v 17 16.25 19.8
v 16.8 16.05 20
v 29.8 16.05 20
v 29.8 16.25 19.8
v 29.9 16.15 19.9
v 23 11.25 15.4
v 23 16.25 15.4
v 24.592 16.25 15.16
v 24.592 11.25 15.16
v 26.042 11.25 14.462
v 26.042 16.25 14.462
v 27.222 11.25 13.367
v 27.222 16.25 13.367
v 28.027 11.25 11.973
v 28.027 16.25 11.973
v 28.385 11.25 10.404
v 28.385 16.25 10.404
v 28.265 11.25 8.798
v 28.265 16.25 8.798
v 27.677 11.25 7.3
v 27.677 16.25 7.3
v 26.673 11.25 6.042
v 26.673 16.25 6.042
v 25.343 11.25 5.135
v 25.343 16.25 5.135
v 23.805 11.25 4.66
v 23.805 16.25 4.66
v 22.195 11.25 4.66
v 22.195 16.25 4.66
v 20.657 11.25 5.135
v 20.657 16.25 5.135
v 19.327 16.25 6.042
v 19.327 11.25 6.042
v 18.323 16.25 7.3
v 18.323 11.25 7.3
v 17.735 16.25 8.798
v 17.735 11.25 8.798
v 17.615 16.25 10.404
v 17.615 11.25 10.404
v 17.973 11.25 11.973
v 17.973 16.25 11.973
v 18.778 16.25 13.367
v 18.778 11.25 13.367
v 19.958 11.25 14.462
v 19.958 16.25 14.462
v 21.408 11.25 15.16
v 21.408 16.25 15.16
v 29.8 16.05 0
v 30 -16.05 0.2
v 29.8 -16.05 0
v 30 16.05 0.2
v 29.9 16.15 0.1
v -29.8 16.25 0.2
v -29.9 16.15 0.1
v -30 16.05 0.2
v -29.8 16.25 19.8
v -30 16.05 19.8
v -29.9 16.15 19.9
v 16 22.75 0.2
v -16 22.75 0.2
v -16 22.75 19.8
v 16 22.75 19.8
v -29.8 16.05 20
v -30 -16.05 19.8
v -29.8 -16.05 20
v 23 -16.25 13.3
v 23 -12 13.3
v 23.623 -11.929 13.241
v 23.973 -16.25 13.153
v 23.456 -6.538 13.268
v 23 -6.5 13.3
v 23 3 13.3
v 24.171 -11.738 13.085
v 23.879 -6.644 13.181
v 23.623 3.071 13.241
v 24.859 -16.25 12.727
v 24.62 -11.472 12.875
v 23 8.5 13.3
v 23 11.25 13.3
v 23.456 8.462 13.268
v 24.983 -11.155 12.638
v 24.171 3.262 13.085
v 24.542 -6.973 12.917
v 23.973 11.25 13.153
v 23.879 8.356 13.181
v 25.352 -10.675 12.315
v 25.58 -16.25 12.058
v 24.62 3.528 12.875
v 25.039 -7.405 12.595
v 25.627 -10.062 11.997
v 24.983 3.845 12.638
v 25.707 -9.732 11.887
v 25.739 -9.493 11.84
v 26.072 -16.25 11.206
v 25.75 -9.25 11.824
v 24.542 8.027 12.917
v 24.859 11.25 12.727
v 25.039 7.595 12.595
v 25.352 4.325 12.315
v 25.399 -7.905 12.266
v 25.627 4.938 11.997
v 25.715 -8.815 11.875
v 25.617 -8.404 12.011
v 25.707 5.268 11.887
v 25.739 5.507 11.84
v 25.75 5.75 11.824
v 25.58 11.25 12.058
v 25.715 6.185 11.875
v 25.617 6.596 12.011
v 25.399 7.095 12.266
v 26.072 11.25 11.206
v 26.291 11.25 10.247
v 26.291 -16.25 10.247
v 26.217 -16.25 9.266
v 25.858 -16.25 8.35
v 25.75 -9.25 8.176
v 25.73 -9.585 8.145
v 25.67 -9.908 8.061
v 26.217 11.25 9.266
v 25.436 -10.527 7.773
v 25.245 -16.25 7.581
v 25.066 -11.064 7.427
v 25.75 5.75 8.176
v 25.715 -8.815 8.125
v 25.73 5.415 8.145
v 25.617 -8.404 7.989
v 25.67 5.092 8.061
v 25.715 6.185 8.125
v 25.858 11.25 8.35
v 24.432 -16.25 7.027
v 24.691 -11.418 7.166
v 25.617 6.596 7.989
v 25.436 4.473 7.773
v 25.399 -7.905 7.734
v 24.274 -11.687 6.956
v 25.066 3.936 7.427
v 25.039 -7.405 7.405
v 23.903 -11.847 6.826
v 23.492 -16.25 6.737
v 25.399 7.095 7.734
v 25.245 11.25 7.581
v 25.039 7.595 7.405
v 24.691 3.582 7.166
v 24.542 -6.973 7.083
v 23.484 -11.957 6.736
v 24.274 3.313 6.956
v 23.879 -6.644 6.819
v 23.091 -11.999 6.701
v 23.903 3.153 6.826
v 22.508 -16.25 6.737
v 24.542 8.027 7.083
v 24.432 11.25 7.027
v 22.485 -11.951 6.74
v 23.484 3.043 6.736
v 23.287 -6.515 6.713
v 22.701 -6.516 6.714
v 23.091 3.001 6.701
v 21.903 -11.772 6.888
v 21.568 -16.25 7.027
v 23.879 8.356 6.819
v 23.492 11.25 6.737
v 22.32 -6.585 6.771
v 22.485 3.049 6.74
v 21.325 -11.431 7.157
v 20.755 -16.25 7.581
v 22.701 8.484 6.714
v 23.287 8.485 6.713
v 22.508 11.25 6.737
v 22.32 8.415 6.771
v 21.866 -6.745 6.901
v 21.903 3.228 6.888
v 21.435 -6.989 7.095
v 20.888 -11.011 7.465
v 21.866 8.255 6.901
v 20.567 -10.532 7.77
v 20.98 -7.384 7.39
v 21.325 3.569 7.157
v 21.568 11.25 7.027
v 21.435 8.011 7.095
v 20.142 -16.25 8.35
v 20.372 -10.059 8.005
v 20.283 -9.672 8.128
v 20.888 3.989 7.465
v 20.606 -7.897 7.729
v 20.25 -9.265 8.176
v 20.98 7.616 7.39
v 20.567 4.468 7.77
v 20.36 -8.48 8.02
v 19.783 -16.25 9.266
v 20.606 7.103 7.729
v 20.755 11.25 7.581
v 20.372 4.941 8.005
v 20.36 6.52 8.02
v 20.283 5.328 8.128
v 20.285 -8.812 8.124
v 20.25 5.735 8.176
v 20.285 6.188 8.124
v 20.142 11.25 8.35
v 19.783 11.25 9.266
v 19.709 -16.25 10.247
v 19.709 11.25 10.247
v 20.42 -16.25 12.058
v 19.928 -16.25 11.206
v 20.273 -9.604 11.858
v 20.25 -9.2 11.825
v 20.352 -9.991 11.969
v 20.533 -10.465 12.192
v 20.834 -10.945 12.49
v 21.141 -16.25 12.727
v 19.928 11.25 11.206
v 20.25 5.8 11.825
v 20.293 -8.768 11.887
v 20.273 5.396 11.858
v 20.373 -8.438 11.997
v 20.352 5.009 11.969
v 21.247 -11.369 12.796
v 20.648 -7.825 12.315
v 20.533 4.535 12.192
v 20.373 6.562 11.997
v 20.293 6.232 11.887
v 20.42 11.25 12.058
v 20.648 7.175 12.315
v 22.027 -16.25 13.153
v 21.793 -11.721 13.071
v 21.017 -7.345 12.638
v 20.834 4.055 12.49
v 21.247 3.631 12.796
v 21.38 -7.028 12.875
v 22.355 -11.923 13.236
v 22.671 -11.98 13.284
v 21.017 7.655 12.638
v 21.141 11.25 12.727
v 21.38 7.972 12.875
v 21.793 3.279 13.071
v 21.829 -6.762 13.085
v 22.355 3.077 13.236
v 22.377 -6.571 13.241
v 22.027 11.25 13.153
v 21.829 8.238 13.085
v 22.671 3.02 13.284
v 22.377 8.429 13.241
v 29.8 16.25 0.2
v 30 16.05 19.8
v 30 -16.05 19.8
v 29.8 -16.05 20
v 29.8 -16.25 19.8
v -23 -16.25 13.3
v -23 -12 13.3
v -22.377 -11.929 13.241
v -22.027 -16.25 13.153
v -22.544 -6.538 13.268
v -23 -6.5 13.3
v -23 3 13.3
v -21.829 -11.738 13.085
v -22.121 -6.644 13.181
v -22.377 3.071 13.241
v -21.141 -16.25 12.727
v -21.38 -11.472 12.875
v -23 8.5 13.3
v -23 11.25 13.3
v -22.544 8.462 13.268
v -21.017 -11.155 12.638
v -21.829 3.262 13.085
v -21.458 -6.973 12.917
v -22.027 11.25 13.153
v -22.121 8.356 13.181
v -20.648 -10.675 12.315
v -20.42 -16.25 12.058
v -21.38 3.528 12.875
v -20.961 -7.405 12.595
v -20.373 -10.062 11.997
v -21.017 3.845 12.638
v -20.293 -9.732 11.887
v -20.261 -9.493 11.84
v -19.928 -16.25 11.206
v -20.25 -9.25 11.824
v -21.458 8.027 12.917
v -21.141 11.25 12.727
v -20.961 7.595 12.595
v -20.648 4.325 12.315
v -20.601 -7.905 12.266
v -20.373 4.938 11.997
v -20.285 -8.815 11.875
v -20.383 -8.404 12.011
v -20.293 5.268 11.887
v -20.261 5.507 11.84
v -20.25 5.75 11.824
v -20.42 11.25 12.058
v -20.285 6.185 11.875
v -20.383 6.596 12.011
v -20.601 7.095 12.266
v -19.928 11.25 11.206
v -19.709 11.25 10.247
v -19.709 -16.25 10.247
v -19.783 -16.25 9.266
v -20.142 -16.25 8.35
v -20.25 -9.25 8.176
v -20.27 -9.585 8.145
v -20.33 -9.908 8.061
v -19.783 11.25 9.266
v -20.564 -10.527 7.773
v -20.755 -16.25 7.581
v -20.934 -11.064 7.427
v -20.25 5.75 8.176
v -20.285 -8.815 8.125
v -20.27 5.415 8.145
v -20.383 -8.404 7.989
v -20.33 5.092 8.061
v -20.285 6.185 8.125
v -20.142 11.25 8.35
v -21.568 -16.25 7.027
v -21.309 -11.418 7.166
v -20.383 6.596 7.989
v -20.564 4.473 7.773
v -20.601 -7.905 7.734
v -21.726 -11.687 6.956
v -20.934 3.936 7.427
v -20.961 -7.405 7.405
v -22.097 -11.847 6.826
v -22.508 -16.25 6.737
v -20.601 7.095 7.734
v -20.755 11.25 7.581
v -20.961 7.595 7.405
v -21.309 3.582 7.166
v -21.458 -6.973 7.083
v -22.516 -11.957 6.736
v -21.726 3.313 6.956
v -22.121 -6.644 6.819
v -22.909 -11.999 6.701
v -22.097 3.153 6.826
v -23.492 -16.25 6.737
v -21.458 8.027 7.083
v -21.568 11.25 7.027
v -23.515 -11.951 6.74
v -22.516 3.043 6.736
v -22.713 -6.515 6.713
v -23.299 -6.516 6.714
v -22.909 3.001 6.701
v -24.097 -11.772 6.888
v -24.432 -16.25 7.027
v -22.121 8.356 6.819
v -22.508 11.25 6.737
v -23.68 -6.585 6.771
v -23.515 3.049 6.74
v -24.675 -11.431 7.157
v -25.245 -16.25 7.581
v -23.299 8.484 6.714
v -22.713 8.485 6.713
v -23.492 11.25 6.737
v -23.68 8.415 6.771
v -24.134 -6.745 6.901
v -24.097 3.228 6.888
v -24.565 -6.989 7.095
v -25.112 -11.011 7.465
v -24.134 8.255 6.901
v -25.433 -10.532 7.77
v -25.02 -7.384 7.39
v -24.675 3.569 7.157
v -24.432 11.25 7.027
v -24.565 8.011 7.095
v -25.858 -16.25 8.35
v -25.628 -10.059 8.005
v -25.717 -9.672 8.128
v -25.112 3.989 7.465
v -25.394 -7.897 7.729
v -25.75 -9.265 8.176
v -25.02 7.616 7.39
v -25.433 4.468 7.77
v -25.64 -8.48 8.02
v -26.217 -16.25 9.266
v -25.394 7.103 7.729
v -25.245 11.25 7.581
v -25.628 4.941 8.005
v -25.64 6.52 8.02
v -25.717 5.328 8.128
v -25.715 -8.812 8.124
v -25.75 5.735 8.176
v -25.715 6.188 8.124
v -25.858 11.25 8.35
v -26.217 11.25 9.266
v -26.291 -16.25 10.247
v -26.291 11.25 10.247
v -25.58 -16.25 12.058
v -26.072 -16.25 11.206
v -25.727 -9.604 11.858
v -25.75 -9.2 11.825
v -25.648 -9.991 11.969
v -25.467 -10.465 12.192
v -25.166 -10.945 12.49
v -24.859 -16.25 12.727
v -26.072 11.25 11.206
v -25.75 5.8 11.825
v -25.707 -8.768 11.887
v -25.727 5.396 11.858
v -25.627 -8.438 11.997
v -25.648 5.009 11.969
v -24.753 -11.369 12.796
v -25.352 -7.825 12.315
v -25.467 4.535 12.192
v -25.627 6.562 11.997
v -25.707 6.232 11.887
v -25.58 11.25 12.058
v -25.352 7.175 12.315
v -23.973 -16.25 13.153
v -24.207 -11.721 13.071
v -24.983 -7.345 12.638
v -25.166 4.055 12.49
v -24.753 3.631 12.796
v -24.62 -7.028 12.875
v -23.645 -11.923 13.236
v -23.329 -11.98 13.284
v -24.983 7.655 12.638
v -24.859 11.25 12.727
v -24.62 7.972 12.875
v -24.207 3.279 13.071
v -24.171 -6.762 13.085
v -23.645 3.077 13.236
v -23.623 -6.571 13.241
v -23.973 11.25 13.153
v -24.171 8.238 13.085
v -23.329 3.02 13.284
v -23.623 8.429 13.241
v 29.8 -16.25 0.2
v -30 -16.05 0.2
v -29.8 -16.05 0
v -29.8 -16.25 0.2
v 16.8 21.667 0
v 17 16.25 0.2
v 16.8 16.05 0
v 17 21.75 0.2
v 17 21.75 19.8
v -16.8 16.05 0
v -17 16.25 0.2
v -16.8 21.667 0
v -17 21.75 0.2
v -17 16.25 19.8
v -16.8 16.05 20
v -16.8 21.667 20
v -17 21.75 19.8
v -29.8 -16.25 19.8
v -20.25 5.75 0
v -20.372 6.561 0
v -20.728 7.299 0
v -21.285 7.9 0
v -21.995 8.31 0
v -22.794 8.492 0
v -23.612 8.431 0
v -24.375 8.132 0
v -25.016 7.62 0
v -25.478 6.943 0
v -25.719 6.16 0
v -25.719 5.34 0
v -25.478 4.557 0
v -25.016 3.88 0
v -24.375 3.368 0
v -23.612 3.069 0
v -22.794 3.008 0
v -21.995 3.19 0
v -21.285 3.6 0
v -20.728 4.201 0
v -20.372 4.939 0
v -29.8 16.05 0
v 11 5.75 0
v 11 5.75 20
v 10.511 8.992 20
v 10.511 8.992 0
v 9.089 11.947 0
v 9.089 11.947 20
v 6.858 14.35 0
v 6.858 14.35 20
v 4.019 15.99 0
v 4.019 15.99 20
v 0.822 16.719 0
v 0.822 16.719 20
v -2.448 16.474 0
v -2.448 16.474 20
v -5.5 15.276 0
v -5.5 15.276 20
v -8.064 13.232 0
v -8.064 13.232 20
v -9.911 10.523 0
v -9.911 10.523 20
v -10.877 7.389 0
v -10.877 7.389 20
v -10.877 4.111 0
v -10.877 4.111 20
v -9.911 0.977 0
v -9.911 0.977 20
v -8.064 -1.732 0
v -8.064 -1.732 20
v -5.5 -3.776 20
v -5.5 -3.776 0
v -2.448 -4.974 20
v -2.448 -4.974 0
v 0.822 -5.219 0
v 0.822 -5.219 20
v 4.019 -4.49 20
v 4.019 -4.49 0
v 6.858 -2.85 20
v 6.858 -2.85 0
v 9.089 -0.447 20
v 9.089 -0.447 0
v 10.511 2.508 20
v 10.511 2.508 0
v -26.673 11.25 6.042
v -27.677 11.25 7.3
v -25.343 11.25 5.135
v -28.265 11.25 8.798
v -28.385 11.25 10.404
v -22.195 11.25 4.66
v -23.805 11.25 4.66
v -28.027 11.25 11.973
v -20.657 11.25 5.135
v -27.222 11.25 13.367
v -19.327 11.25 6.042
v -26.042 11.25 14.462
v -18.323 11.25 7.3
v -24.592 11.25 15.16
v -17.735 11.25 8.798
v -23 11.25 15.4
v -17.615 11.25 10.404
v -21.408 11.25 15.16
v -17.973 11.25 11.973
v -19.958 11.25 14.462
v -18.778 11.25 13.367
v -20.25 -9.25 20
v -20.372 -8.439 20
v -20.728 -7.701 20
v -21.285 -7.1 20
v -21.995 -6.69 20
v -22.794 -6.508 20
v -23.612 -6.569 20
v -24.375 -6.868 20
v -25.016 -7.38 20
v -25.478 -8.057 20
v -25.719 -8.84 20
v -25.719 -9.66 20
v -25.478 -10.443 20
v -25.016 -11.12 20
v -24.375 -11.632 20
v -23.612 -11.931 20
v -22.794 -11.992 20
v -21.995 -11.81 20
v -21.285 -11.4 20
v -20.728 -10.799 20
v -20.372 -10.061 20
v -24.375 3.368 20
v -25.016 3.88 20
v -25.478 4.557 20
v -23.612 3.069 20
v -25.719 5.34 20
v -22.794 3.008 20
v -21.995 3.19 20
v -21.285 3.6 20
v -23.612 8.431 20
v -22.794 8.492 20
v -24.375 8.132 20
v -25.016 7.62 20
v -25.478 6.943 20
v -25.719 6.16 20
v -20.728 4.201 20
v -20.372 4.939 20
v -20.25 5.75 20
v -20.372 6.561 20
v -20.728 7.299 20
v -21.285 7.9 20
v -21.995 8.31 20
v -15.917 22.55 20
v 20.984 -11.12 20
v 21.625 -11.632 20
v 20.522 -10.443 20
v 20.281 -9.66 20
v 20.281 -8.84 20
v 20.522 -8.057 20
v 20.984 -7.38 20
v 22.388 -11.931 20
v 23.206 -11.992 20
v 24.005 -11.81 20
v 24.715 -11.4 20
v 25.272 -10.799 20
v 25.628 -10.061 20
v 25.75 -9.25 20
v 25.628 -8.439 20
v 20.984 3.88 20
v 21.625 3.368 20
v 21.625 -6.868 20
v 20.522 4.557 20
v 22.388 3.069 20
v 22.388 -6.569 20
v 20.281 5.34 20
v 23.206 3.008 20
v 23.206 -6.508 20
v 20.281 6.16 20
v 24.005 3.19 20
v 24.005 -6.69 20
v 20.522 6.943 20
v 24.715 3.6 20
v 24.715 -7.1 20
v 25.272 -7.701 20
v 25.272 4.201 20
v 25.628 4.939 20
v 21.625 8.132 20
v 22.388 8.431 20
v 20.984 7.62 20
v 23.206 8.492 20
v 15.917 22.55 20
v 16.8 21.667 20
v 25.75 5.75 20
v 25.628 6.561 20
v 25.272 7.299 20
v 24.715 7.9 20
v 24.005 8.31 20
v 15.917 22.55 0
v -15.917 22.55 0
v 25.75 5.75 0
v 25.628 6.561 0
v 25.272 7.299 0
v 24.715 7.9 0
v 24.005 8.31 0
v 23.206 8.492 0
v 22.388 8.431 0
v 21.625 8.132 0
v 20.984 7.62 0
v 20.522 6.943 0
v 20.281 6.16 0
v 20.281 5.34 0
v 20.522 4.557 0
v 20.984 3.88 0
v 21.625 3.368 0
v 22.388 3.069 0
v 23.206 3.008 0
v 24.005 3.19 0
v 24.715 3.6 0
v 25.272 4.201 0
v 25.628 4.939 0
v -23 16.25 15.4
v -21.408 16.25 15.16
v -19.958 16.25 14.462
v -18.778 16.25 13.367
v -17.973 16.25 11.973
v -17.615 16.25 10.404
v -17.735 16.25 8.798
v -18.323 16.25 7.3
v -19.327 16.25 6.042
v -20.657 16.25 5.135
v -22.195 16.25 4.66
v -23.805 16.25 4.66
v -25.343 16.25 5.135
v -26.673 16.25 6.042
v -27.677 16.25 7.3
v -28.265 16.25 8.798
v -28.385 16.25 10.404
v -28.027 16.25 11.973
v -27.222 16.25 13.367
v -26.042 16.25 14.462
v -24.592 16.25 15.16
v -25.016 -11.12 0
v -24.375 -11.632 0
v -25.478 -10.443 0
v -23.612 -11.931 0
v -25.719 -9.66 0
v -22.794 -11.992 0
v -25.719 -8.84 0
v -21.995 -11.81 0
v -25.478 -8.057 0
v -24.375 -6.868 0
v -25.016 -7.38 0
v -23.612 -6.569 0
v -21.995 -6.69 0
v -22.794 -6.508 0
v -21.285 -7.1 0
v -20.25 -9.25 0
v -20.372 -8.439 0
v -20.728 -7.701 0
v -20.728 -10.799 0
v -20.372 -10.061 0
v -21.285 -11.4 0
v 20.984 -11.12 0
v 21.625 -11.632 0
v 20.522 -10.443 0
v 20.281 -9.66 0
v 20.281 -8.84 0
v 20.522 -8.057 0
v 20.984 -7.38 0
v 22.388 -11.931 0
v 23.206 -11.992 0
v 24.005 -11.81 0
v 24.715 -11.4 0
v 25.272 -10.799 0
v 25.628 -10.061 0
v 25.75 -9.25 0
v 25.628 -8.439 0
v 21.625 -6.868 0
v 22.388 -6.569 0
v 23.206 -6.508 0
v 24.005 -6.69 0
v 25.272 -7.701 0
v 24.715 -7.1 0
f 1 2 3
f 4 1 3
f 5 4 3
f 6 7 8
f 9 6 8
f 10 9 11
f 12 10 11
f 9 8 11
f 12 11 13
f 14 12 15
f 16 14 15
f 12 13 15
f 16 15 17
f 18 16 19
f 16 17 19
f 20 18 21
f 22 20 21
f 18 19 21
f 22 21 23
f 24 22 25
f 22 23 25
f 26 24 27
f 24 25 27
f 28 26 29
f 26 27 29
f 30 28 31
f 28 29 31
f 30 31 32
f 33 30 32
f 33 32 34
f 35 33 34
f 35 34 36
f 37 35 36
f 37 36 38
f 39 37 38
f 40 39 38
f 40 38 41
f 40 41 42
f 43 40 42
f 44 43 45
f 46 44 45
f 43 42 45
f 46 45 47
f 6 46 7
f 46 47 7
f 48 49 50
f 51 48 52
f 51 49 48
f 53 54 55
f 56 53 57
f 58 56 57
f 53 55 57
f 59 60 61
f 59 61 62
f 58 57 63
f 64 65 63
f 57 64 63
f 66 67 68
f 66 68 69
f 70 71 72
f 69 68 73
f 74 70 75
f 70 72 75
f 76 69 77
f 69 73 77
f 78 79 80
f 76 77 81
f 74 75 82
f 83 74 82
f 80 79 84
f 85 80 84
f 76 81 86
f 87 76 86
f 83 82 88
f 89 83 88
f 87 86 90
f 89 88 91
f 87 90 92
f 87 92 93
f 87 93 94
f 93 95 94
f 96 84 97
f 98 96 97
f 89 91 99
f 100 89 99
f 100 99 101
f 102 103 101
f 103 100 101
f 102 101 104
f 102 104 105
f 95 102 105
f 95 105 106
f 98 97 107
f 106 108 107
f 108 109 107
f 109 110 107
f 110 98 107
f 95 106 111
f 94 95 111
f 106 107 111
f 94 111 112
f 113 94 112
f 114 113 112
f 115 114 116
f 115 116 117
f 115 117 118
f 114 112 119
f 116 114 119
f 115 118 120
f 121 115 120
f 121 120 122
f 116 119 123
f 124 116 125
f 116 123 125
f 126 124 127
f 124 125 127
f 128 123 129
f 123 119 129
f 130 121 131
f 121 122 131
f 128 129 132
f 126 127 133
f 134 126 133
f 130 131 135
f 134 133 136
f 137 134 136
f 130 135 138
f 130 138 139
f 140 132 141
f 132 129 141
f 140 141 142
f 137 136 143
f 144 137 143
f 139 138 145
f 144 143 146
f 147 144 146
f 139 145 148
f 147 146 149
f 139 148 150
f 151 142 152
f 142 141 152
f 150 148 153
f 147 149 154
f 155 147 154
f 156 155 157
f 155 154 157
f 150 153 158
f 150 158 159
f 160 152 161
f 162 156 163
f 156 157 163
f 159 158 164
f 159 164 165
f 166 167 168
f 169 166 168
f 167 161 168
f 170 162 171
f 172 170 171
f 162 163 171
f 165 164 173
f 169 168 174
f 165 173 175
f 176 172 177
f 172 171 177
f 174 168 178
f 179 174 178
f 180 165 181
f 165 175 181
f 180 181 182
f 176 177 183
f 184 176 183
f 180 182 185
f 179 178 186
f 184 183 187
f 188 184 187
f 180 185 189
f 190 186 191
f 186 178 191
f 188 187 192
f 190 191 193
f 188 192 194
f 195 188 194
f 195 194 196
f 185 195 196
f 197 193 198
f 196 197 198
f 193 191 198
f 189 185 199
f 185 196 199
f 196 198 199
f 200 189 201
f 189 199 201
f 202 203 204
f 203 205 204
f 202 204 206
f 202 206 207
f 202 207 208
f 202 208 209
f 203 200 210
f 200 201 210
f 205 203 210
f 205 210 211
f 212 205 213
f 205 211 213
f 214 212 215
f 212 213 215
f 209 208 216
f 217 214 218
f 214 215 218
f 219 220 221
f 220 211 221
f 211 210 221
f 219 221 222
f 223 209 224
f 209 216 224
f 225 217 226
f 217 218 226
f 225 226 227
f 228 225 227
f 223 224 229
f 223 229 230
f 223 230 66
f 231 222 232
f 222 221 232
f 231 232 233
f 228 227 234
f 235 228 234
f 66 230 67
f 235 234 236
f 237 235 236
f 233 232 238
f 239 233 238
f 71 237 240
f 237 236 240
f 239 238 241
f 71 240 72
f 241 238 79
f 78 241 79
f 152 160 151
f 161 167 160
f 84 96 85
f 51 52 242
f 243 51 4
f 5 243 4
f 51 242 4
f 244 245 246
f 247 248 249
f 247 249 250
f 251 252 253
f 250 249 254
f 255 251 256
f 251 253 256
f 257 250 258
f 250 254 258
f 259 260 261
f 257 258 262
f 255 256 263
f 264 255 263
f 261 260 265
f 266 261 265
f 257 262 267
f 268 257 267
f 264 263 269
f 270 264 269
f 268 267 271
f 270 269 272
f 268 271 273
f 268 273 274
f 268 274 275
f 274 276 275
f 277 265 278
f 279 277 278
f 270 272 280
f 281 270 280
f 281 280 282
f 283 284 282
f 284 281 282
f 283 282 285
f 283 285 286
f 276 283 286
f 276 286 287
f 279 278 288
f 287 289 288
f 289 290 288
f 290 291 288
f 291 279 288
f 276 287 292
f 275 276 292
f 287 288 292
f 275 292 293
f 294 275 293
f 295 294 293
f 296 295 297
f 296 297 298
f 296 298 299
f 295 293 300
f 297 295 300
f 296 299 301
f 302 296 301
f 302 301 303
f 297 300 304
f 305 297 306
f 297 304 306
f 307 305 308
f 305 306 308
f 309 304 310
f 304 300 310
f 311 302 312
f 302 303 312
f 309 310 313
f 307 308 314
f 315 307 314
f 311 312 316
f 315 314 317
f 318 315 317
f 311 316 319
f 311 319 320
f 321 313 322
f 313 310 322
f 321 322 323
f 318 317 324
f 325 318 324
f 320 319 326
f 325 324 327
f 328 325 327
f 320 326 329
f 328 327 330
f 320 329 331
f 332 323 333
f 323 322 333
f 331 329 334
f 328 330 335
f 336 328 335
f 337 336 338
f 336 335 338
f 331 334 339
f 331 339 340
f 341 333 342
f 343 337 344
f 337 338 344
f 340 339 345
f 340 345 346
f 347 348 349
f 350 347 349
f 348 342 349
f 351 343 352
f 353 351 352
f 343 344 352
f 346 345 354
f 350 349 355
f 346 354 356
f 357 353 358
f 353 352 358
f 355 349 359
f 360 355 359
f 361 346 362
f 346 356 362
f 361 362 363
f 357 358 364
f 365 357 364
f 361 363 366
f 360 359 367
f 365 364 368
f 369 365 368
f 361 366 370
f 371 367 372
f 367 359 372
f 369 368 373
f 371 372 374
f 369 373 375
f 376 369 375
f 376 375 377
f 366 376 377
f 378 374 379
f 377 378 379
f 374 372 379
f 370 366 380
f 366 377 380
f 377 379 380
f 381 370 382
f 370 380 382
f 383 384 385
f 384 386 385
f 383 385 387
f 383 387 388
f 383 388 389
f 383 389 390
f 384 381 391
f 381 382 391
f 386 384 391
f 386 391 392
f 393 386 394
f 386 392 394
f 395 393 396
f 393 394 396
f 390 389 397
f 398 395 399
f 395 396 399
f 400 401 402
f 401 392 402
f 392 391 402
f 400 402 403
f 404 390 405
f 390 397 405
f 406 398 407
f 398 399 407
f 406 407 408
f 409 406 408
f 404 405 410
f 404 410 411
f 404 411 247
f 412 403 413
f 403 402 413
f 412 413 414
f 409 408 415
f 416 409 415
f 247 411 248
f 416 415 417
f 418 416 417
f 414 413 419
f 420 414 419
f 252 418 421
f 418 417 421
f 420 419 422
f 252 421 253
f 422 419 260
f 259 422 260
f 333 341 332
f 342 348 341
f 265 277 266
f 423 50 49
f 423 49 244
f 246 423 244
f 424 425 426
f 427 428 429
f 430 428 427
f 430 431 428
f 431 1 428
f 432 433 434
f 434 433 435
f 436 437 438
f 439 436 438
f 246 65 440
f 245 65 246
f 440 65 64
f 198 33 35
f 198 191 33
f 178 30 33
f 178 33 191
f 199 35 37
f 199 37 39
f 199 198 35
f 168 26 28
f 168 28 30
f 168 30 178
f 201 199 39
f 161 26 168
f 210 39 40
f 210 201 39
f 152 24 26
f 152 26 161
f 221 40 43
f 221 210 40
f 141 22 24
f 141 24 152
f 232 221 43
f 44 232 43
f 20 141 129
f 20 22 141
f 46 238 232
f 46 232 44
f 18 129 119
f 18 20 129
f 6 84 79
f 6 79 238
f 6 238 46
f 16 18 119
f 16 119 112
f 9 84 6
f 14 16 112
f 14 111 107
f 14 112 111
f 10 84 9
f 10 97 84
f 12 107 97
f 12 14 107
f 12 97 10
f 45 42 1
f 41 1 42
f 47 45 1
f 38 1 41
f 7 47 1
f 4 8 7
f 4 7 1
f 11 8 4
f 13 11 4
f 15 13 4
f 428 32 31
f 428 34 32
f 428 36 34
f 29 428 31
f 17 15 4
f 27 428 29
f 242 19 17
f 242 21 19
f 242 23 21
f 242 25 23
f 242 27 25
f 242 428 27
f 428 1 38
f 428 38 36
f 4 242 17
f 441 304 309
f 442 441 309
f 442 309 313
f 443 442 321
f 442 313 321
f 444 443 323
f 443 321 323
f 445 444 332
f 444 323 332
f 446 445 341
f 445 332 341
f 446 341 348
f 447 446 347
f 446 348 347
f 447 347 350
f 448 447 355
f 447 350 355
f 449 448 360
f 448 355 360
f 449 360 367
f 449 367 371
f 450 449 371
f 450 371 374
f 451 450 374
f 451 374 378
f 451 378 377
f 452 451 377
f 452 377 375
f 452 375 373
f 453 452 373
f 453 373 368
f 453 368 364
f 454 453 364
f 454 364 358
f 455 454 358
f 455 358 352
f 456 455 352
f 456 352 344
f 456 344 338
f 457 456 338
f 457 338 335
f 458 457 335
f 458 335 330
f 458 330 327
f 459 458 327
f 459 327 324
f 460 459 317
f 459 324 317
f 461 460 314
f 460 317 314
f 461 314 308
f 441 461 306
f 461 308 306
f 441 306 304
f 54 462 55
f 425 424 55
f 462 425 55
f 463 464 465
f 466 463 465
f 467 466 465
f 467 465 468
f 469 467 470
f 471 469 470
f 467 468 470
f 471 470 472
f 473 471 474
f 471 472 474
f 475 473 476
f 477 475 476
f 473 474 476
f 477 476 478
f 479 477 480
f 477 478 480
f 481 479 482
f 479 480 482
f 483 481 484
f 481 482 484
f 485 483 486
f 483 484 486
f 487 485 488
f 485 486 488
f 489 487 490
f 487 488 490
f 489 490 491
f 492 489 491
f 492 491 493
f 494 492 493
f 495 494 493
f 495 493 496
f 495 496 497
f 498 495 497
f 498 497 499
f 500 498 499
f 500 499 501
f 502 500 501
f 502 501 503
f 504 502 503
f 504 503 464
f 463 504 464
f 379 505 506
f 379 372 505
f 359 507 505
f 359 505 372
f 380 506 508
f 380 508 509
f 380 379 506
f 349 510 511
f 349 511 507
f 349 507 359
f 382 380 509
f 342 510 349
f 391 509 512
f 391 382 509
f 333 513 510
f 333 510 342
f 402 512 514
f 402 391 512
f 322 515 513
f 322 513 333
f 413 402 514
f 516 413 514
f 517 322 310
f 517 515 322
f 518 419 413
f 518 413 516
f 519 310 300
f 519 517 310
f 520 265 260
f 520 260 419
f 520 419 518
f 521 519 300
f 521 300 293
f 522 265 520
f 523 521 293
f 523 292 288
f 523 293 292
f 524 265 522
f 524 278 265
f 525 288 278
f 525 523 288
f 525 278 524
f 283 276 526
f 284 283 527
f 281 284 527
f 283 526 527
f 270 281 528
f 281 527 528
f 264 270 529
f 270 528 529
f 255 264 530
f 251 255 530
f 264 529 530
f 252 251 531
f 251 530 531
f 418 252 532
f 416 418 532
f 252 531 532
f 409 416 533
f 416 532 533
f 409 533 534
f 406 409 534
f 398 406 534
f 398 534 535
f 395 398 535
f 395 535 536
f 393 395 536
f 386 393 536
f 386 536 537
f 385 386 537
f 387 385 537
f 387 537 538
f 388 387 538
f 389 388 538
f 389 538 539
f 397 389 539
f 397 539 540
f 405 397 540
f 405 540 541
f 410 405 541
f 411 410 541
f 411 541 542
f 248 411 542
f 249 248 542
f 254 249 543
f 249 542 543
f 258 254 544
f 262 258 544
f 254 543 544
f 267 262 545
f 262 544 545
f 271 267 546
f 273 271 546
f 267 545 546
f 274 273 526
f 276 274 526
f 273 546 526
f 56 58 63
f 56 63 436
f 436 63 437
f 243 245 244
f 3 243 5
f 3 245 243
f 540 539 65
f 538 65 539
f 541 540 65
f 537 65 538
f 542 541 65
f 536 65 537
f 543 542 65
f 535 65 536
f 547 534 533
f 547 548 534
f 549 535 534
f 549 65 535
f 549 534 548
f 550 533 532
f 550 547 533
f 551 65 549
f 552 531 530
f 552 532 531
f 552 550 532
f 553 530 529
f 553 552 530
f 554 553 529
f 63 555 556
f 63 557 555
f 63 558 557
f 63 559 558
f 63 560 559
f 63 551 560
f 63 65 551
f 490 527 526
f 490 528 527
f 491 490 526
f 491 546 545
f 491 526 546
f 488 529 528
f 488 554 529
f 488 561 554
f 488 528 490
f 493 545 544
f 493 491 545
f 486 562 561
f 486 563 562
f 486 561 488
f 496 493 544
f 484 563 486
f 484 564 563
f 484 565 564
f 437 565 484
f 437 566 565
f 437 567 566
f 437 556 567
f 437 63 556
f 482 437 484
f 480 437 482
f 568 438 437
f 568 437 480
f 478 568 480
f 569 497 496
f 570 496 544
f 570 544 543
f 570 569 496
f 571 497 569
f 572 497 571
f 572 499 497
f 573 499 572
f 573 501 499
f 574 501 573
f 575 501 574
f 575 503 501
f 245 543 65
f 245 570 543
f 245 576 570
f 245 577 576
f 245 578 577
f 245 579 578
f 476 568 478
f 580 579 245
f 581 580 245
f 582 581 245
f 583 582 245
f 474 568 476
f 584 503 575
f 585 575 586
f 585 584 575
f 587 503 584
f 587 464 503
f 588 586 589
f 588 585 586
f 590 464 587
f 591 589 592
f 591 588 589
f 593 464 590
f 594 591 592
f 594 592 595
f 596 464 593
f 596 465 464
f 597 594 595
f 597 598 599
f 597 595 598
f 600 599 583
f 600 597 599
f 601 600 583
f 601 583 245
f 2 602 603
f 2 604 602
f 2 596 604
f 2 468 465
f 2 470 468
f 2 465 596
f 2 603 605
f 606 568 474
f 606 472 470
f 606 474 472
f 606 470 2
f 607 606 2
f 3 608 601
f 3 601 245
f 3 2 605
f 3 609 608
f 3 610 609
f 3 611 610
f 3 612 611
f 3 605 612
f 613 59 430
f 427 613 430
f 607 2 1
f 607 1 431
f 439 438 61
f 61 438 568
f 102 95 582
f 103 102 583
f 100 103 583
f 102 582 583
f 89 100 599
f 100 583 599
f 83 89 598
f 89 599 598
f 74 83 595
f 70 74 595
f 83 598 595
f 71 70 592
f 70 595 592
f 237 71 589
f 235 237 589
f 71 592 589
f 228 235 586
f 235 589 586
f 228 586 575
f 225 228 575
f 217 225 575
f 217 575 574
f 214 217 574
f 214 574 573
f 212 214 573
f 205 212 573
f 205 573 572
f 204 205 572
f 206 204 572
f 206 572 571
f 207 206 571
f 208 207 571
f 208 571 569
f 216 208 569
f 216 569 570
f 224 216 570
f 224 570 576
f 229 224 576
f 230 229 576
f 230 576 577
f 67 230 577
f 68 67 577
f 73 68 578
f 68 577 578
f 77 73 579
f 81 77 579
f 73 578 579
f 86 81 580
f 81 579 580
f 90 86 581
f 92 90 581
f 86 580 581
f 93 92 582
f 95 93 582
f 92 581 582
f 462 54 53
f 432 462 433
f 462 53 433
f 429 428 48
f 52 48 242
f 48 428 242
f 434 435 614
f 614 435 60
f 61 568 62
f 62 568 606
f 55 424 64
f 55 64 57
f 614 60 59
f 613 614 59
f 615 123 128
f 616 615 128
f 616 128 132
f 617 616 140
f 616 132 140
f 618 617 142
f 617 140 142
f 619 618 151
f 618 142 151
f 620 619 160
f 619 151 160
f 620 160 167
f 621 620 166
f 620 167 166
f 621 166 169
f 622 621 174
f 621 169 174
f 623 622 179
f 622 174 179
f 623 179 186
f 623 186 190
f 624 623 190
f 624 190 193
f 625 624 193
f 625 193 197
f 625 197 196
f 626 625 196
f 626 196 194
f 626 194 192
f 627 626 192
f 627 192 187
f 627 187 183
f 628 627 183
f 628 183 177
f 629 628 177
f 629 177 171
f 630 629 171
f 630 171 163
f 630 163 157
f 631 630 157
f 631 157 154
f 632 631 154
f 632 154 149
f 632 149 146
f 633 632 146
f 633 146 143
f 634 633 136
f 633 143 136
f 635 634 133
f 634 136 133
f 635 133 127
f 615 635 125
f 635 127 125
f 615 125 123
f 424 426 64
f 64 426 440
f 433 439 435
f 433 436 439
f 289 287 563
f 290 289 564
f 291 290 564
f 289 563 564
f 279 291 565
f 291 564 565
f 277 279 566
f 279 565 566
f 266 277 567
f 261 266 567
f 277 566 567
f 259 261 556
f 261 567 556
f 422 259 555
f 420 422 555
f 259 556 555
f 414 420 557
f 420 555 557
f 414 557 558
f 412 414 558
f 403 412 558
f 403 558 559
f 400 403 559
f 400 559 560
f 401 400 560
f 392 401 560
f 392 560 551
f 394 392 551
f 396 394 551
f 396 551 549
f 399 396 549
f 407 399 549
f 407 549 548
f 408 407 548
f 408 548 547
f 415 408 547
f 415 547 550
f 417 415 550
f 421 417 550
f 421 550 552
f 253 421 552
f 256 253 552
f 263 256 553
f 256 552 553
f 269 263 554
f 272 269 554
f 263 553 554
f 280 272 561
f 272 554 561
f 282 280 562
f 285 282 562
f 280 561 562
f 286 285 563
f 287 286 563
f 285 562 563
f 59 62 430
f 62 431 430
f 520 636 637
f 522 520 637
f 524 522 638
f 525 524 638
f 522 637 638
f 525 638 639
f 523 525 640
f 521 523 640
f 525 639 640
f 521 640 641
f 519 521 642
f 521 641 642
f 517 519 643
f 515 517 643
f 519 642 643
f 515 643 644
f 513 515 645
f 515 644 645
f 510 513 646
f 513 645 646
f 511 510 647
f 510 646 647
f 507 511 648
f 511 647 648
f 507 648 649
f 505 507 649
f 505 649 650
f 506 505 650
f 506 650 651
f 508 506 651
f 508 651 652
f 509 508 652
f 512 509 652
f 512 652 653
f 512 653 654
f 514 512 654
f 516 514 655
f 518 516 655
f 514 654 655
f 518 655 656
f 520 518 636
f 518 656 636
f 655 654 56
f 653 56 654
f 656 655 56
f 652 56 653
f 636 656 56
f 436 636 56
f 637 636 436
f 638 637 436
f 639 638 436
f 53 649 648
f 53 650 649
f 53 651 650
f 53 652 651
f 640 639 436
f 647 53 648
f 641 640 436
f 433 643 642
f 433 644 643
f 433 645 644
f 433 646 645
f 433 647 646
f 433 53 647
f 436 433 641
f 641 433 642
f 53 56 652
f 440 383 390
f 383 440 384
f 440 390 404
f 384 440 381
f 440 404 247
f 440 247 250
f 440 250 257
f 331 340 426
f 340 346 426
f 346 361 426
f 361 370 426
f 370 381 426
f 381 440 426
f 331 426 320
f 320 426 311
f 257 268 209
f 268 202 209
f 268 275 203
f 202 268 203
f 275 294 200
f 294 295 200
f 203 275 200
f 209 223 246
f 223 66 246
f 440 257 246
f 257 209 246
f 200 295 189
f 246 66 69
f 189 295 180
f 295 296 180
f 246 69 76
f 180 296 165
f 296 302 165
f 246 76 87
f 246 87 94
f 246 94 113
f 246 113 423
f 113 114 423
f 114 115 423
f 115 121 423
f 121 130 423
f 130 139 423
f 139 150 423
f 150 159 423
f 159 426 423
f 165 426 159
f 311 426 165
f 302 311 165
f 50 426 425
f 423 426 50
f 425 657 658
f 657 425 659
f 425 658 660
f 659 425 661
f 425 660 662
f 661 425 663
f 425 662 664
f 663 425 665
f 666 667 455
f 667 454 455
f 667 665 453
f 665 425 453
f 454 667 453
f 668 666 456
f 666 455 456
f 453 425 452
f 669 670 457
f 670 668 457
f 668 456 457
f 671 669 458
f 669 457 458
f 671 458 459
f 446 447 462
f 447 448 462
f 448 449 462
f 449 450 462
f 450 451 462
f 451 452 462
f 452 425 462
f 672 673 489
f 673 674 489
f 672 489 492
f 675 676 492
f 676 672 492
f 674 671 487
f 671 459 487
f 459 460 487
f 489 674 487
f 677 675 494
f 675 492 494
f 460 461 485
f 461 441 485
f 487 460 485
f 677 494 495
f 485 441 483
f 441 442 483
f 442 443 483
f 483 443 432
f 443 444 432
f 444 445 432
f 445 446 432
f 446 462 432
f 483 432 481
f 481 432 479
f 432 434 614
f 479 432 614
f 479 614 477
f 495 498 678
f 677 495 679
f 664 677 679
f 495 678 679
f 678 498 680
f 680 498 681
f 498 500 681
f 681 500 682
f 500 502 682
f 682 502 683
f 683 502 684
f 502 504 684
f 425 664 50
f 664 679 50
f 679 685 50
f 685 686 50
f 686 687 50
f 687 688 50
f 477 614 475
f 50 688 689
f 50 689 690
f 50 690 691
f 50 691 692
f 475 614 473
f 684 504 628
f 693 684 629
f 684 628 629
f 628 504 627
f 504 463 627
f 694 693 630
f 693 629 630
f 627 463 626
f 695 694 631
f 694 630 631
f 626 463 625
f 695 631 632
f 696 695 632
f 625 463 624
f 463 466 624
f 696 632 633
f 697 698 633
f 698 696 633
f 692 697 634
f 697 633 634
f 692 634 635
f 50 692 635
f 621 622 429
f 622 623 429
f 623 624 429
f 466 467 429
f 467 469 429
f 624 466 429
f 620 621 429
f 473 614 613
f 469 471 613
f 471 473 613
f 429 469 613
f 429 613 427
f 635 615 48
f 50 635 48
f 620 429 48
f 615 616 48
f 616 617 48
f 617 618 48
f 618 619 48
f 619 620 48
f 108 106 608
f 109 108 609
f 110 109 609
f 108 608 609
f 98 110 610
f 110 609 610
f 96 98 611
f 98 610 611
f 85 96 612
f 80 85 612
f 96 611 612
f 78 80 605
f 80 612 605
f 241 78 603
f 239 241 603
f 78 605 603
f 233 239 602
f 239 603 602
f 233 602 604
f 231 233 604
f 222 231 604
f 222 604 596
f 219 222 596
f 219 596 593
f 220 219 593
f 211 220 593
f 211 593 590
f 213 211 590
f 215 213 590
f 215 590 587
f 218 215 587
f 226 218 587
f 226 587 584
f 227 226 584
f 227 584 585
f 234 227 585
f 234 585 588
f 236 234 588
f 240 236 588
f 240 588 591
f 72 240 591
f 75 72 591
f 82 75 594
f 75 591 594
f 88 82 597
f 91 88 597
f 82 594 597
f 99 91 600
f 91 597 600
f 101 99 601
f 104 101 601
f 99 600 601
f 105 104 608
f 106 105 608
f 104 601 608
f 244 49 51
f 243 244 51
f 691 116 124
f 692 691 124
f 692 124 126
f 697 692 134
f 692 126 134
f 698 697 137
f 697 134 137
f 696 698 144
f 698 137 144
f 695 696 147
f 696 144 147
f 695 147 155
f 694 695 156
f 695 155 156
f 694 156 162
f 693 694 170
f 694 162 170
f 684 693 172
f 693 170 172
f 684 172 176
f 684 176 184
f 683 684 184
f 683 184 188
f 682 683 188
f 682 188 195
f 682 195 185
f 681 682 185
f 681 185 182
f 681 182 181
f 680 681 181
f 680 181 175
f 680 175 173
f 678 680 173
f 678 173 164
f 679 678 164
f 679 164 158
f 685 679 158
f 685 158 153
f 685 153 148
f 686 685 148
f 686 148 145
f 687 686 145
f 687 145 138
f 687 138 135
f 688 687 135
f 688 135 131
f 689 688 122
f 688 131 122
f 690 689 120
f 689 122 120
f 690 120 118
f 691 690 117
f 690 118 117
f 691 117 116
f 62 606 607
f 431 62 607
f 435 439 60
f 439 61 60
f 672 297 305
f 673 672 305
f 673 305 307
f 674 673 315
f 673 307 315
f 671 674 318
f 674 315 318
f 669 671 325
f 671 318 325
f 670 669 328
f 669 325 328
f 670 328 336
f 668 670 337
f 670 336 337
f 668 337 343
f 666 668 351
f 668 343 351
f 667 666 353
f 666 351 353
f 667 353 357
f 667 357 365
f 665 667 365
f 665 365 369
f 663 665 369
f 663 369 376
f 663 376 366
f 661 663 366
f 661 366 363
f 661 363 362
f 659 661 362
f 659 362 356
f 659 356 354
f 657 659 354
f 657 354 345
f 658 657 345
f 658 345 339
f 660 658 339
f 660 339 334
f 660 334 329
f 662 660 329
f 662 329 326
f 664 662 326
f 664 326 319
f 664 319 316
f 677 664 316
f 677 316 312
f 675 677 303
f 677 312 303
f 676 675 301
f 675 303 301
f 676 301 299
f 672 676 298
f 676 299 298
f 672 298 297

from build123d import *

# Parameters (mm, degrees)
SKETCH_1_W          = 60
SKETCH_1_H          = 32.5
EXTRUDE_1_DEPTH     = 20
SKETCH_2_W          = 34
SKETCH_2_H          = 20
EXTRUDE_2_DEPTH     = 6.5
SKETCH_3_R          = 5.4
CUT_EXTRUDE_1_DEPTH = 5
SKETCH_4_R          = 3.3
CUT_EXTRUDE_2_DEPTH = 46.345892868
SKETCH_7_R          = 2.75
CUT_EXTRUDE_3_DEPTH = 43.632880503
SKETCH_8_R          = 11
CUT_EXTRUDE_4_DEPTH = 35
CHAMFER_1_SIZE      = 1
CHAMFER_2_SIZE      = 0.2
CHAMFER_3_SIZE      = 0.2


with BuildPart() as part:
    # 草图1 → 凸台-拉伸1 (new body)
    with BuildSketch(Plane.XY):
        Rectangle(SKETCH_1_W, SKETCH_1_H)
    extrude(amount=EXTRUDE_1_DEPTH)

    # 草图2 → 凸台-拉伸2 (add)
    with BuildSketch(Plane(origin=(0, 16.25, 0), x_dir=(1, 0, 0), z_dir=(0, 1, 0))):
        with Locations((0, -10)):
            Rectangle(SKETCH_2_W, SKETCH_2_H)
    extrude(amount=EXTRUDE_2_DEPTH)

    # 草图3 → 切除-拉伸1 (cut)
    with BuildSketch(Plane(origin=(0, 16.25, 0), x_dir=(1, 0, 0), z_dir=(0, 1, 0))):
        with Locations(Location((-23, -10, 0), (0, 0, 270))):
            Circle(SKETCH_3_R)
        with Locations(Location((23, -10, 0), (0, 0, 270))):
            Circle(SKETCH_3_R)
    extrude(amount=-CUT_EXTRUDE_1_DEPTH, mode=Mode.SUBTRACT)

    # 草图4 → 切除-拉伸2 (cut, through all)
    with BuildSketch(Plane(origin=(0, 11.25, 0), x_dir=(1, 0, 0), z_dir=(0, 1, 0))):
        with Locations(Location((-23, -10, 0), (0, 0, 270))):
            Circle(SKETCH_4_R)
        with Locations(Location((23, -10, 0), (0, 0, 270))):
            Circle(SKETCH_4_R)
    extrude(amount=-CUT_EXTRUDE_2_DEPTH, mode=Mode.SUBTRACT)

    # 草图7 → 切除-拉伸3 (cut, through all)
    with BuildSketch(Plane.XY.offset(20)):
        with Locations((-23, 5.75)):
            Circle(SKETCH_7_R)
        with Locations((23, 5.75)):
            Circle(SKETCH_7_R)
        with Locations((-23, -9.25)):
            Circle(SKETCH_7_R)
        with Locations((23, -9.25)):
            Circle(SKETCH_7_R)
    extrude(amount=-CUT_EXTRUDE_3_DEPTH, mode=Mode.SUBTRACT)

    # 草图8 → 切除-拉伸4 (cut)
    with BuildSketch(Plane.XY.offset(20)):
        with Locations((0, 5.75)):
            Circle(SKETCH_8_R)
    extrude(amount=-CUT_EXTRUDE_4_DEPTH, mode=Mode.SUBTRACT)

    # 倒角1
    chamfer_1_edges = [part.edges().sort_by_distance(p)[0] for p in [
        (17, 22.75, 10),
        (-17, 22.75, 10),
    ]]
    chamfer(chamfer_1_edges, length=CHAMFER_1_SIZE)

    # 倒角2
    chamfer_2_edges = [part.edges().sort_by_distance(p)[0] for p in [
        (-16.5, 22.25, 0),
        (-17, 19, 0),
        (-23.5, 16.25, 0),
        (0, 22.75, 0),
        (16.5, 22.25, 0),
        (17, 19, 0),
        (23.5, 16.25, 0),
        (30, 16.25, 10),
        (23.5, 16.25, 20),
        (17, 19, 20),
        (16.5, 22.25, 20),
        (0, 22.75, 20),
        (-16.5, 22.25, 20),
        (-17, 19, 20),
        (-23.5, 16.25, 20),
        (-30, 16.25, 10),
    ]]
    chamfer(chamfer_2_edges, length=CHAMFER_2_SIZE)

    # 倒角3
    chamfer_3_edges = [part.edges().sort_by_distance(p)[0] for p in [
        (-30, -0.1, 0),
        (-30, -0.1, 20),
        (0, -16.25, 20),
        (30, -0.1, 20),
        (0, -16.25, 0),
        (30, -0.1, 0),
        (30, -16.25, 10),
        (-30, -16.25, 10),
    ]]
    chamfer(chamfer_3_edges, length=CHAMFER_3_SIZE)


solid = part.part
